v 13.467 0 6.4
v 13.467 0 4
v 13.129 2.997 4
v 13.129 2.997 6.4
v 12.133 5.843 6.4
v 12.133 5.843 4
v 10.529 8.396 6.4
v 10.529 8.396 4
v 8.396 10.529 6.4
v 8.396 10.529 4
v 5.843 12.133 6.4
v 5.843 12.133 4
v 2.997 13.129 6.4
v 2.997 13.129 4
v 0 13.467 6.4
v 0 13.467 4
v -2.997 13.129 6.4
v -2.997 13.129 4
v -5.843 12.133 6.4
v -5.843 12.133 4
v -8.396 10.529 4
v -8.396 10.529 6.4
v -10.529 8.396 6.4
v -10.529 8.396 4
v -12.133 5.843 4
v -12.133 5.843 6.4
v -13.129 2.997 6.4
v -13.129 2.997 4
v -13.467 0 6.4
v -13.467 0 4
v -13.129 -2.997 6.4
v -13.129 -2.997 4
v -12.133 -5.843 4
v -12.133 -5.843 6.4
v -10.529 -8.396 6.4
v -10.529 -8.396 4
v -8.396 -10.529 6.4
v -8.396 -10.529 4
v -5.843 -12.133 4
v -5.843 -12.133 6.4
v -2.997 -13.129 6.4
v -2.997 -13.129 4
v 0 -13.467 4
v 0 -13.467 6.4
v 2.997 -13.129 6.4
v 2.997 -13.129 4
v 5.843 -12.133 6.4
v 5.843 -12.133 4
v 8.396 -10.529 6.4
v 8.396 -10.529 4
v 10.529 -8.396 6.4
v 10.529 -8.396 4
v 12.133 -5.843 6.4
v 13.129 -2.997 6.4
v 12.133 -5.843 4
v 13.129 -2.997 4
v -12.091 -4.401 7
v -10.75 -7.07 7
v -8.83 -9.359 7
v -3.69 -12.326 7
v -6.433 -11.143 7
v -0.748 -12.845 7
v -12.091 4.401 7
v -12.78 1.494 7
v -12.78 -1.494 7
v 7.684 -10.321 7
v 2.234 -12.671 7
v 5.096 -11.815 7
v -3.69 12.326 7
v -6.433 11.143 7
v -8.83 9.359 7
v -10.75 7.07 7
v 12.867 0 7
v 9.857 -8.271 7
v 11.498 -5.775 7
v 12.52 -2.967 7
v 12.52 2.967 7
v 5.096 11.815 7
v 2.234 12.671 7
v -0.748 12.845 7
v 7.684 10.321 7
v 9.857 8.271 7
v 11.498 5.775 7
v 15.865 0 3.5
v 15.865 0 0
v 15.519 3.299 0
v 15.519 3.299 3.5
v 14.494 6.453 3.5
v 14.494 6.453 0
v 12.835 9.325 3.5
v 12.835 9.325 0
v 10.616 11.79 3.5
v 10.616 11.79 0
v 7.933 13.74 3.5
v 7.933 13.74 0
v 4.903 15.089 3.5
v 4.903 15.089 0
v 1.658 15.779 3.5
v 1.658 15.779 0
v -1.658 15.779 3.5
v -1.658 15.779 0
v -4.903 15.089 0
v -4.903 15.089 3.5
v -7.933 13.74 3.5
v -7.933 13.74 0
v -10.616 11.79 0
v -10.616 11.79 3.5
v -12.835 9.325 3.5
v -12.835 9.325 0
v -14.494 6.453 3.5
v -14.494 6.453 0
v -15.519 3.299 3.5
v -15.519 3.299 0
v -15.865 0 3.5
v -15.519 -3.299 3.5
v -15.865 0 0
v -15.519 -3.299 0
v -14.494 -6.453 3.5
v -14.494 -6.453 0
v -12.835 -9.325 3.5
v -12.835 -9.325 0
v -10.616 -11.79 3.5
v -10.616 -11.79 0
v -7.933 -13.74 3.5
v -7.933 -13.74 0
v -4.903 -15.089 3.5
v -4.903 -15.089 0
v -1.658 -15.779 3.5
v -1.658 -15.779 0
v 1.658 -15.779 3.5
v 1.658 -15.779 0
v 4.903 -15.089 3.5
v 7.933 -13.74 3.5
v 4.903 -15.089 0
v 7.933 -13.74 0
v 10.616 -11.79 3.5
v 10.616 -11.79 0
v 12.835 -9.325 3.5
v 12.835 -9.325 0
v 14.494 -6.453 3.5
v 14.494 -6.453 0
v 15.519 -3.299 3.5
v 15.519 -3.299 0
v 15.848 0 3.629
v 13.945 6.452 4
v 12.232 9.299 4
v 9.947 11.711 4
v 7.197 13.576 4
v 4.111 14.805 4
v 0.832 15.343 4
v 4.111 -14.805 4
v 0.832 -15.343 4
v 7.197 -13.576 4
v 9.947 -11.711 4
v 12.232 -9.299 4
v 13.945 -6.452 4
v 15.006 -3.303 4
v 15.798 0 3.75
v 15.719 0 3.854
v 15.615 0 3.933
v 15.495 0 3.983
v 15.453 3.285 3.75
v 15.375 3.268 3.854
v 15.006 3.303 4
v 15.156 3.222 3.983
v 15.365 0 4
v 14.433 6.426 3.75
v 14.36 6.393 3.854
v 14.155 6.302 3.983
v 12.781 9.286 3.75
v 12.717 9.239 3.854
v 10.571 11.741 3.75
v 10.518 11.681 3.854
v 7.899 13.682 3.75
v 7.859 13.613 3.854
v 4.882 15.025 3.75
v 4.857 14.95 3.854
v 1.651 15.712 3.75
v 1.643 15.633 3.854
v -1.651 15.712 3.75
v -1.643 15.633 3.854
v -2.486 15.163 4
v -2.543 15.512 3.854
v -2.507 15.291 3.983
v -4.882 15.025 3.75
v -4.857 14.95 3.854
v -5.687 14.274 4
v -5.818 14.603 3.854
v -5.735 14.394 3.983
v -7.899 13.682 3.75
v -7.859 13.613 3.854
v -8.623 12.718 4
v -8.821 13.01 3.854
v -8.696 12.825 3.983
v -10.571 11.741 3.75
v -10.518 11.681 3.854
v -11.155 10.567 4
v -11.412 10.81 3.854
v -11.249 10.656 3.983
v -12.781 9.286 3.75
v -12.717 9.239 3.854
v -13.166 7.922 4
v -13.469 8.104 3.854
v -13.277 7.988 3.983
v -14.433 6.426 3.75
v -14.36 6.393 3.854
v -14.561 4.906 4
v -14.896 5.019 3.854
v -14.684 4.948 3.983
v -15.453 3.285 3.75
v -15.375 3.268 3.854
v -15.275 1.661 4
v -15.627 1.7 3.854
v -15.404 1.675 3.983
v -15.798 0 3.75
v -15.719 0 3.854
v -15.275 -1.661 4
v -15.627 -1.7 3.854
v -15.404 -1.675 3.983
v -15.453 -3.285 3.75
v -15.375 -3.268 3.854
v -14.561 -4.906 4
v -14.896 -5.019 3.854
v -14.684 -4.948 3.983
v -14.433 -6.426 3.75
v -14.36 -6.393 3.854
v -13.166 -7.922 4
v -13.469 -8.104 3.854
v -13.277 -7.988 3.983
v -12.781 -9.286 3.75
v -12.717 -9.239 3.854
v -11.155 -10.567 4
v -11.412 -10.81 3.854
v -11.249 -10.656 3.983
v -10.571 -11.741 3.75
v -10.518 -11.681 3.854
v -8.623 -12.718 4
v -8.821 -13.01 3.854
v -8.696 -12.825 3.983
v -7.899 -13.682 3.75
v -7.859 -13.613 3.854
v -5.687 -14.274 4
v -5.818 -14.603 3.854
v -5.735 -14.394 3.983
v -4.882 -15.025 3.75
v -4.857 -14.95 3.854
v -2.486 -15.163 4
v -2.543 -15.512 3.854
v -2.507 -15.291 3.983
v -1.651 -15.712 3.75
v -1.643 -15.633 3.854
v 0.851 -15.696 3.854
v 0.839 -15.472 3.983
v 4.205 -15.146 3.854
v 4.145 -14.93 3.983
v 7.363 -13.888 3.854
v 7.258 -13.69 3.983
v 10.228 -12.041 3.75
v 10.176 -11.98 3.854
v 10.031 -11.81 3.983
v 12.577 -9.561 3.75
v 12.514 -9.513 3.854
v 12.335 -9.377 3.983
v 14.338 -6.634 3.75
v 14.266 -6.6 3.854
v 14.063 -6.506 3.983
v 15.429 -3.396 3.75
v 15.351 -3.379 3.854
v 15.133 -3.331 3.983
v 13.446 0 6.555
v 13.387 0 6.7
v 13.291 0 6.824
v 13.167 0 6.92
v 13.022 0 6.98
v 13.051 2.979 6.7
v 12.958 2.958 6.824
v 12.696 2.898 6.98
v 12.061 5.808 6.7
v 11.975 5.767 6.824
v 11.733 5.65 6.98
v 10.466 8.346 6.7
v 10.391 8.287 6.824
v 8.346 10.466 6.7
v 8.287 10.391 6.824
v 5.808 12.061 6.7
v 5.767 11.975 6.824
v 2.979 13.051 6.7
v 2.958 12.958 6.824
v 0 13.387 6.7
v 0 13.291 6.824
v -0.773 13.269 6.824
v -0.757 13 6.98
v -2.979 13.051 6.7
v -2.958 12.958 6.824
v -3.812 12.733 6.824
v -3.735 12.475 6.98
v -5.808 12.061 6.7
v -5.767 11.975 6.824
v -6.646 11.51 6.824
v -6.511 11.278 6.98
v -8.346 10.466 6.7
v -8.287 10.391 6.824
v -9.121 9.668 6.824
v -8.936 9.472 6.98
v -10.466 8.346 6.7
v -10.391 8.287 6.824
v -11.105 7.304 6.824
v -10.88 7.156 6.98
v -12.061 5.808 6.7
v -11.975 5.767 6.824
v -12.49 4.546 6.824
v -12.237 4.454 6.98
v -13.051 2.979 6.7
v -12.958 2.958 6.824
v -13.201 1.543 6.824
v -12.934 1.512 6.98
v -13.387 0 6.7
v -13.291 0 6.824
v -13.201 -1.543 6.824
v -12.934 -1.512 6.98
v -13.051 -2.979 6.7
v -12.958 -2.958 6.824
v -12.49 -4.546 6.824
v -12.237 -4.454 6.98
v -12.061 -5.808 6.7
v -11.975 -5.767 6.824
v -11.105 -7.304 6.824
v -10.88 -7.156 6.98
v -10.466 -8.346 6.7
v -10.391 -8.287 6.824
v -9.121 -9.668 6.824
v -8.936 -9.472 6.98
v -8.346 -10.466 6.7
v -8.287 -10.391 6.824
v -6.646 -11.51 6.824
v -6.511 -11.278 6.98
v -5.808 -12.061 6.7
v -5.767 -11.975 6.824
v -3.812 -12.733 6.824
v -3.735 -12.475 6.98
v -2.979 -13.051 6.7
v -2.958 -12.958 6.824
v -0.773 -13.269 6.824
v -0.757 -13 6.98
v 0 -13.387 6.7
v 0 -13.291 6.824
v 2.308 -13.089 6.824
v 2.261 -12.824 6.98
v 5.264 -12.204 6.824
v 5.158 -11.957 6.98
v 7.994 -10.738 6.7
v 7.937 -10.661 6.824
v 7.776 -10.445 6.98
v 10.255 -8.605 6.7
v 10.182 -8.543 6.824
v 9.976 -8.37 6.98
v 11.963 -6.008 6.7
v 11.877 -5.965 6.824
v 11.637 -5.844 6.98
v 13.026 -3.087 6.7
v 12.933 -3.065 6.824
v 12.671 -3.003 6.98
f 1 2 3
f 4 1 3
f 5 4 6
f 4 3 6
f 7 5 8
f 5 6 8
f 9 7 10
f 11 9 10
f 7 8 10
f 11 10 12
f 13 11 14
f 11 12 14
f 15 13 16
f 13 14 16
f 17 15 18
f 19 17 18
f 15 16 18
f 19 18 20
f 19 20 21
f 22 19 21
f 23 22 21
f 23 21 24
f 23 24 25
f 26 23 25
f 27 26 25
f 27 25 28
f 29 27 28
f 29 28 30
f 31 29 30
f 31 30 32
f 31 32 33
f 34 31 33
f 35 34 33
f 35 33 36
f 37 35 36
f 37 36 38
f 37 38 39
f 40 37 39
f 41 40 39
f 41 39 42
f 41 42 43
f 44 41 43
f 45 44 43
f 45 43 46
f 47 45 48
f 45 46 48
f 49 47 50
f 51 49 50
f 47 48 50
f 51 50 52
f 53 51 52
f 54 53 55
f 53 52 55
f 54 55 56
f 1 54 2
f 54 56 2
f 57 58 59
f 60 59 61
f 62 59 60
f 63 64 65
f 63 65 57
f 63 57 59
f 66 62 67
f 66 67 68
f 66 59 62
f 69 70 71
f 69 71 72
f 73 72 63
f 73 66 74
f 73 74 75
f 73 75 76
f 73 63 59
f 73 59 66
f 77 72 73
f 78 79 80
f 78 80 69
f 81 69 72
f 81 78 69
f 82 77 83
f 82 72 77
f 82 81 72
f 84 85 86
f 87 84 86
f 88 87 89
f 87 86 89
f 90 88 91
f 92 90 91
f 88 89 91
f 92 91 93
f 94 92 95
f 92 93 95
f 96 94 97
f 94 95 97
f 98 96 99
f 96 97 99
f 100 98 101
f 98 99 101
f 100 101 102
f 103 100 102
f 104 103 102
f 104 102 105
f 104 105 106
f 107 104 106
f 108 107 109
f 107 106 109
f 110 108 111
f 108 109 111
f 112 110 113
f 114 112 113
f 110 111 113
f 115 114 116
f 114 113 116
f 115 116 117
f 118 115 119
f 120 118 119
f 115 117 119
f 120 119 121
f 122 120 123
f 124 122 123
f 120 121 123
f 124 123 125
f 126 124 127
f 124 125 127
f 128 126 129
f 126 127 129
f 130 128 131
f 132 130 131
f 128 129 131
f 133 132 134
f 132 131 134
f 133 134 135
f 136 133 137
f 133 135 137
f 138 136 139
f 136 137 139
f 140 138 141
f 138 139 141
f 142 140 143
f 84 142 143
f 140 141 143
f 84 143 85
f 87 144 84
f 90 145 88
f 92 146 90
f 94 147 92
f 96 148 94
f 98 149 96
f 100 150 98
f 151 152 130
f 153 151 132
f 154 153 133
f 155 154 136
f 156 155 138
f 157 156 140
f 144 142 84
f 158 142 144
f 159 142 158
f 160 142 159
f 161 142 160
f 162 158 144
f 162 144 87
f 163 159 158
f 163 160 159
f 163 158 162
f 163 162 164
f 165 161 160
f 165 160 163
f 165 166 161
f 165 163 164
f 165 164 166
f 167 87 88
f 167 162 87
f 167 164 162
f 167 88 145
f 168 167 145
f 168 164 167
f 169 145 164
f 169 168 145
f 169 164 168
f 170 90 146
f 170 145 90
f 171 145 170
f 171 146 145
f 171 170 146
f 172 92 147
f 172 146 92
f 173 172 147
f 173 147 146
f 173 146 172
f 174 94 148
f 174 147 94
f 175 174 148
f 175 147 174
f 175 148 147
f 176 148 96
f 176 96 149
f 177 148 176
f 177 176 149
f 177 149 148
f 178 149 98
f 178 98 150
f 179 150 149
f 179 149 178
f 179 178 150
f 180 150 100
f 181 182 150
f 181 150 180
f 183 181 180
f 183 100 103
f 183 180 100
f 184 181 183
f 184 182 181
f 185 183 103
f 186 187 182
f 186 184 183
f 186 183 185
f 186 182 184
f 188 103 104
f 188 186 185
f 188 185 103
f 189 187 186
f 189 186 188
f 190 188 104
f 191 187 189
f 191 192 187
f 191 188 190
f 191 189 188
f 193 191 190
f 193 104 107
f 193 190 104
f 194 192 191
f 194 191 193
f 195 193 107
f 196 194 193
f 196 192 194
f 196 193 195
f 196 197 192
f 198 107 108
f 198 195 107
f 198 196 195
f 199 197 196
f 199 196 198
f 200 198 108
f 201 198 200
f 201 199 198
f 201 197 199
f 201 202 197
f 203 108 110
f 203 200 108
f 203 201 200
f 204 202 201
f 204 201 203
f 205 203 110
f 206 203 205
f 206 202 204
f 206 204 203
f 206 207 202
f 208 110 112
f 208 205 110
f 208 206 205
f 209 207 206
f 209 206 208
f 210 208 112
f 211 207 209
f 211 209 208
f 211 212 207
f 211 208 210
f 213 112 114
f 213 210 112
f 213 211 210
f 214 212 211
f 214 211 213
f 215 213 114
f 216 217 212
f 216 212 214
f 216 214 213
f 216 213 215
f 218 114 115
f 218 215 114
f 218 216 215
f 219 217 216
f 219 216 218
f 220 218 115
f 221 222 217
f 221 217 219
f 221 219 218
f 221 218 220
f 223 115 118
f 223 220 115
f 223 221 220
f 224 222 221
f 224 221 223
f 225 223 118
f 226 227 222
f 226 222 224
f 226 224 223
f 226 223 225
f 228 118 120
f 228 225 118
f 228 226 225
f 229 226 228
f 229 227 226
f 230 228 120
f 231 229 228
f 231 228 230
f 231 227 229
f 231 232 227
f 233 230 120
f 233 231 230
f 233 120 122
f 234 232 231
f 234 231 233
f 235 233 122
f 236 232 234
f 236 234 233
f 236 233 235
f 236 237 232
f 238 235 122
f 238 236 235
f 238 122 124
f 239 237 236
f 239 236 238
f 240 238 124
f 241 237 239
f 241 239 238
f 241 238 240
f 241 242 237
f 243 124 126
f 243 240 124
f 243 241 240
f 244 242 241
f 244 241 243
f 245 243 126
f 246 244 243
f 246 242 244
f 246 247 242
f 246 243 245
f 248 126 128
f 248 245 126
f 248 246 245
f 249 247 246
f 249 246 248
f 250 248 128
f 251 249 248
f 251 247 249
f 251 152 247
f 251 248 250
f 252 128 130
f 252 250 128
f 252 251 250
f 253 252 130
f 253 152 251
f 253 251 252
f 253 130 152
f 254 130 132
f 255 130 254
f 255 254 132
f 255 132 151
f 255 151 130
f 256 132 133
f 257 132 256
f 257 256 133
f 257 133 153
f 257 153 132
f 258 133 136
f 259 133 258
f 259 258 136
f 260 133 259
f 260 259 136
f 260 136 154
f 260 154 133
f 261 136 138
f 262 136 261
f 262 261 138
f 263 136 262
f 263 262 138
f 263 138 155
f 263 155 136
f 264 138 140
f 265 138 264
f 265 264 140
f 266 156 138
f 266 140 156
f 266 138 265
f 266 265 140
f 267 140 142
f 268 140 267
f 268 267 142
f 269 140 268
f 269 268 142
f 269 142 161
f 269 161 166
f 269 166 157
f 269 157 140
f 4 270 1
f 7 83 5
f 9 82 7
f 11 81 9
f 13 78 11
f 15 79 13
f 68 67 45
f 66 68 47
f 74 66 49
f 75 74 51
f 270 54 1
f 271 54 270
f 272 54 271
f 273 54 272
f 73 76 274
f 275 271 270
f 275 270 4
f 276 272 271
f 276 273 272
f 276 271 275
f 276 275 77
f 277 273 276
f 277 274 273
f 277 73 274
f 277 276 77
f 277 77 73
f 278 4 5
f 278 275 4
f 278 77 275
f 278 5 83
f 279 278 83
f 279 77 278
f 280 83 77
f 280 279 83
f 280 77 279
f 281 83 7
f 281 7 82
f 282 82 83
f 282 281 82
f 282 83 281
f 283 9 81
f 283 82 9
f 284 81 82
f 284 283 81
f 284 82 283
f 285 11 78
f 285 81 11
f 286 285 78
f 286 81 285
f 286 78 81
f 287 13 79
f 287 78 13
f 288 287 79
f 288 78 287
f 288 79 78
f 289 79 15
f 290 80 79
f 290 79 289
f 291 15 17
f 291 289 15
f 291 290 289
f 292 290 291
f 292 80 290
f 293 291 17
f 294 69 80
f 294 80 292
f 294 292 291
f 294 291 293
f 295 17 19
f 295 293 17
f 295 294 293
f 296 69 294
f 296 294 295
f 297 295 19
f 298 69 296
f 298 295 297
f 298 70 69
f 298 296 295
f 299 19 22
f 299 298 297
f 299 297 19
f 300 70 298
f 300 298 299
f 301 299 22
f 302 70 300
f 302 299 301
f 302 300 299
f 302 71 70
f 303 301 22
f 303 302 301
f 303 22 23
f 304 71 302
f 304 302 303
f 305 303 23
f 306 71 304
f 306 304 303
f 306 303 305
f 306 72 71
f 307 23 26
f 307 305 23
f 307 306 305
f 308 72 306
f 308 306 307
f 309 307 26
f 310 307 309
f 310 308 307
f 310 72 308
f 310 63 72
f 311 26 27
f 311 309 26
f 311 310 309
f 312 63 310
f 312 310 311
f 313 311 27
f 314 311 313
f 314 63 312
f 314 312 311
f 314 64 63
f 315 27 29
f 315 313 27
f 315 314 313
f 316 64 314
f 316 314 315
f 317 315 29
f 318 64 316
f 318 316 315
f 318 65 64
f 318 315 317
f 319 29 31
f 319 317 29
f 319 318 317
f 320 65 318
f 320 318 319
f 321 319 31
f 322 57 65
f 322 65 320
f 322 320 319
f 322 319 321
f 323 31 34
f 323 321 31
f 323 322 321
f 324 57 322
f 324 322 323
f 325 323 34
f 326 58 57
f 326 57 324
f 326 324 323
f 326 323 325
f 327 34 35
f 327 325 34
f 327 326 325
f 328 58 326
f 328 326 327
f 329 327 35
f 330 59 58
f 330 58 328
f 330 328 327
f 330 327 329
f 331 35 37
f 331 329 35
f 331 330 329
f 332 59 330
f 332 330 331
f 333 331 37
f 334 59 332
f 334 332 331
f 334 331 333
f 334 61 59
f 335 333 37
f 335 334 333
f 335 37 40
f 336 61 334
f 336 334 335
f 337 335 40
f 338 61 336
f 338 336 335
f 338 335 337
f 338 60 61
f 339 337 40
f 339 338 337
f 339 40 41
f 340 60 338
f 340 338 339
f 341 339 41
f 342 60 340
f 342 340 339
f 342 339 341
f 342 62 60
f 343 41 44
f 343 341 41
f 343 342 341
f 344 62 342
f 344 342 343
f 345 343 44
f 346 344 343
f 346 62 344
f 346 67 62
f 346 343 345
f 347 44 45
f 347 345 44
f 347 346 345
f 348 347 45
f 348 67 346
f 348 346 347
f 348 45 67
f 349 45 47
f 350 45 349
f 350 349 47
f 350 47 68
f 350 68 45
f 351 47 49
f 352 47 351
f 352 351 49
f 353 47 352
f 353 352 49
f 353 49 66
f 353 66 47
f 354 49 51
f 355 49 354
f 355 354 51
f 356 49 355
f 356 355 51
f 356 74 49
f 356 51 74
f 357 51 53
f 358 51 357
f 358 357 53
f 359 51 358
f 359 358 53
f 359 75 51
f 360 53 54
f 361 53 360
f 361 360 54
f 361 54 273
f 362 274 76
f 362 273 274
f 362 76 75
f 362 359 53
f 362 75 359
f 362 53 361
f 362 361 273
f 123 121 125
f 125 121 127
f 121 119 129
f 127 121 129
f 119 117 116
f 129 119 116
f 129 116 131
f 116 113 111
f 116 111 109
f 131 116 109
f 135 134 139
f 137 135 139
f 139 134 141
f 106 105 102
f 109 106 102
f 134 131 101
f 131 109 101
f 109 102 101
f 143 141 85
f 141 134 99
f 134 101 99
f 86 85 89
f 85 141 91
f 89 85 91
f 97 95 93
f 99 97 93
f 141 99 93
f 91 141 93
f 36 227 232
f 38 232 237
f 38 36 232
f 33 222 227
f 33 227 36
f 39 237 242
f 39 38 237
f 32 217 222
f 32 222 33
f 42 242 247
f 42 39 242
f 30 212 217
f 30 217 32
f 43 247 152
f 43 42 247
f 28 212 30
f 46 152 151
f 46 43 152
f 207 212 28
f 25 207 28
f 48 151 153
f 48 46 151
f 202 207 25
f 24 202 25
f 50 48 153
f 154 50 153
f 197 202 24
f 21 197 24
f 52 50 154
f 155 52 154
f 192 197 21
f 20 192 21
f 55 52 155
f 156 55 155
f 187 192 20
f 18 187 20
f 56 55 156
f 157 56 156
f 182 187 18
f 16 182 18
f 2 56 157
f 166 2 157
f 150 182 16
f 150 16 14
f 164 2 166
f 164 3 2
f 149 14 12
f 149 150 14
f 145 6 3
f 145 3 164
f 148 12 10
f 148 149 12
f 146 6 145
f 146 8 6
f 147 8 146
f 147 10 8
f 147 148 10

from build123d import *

# Parameters (mm, degrees)
F0_R     = 13.46689
F1_DEPTH = 7
F2_R     = 0.6
F3_R     = 15.865442
F4_DEPTH = 4
F5_R     = 0.5


with BuildPart() as f1:
    # F0 (on Top) → F1 (new body)
    with BuildSketch(Plane.XY):
        Circle(F0_R)
    extrude(amount=F1_DEPTH)

    # F2
    f2_edges = [f1.edges().sort_by_distance(p)[0] for p in [
        (-13.46689, 0, 7),
    ]]
    fillet(f2_edges, radius=F2_R)

    # F3 (on Top) → F4 (join)
    with BuildSketch(Plane.XY):
        Circle(F3_R)
    extrude(amount=F4_DEPTH)

    # F5
    f5_edges = [f1.edges().sort_by_distance(p)[0] for p in [
        (-15.865442, 0, 4),
    ]]
    fillet(f5_edges, radius=F5_R)


solid = f1.part
